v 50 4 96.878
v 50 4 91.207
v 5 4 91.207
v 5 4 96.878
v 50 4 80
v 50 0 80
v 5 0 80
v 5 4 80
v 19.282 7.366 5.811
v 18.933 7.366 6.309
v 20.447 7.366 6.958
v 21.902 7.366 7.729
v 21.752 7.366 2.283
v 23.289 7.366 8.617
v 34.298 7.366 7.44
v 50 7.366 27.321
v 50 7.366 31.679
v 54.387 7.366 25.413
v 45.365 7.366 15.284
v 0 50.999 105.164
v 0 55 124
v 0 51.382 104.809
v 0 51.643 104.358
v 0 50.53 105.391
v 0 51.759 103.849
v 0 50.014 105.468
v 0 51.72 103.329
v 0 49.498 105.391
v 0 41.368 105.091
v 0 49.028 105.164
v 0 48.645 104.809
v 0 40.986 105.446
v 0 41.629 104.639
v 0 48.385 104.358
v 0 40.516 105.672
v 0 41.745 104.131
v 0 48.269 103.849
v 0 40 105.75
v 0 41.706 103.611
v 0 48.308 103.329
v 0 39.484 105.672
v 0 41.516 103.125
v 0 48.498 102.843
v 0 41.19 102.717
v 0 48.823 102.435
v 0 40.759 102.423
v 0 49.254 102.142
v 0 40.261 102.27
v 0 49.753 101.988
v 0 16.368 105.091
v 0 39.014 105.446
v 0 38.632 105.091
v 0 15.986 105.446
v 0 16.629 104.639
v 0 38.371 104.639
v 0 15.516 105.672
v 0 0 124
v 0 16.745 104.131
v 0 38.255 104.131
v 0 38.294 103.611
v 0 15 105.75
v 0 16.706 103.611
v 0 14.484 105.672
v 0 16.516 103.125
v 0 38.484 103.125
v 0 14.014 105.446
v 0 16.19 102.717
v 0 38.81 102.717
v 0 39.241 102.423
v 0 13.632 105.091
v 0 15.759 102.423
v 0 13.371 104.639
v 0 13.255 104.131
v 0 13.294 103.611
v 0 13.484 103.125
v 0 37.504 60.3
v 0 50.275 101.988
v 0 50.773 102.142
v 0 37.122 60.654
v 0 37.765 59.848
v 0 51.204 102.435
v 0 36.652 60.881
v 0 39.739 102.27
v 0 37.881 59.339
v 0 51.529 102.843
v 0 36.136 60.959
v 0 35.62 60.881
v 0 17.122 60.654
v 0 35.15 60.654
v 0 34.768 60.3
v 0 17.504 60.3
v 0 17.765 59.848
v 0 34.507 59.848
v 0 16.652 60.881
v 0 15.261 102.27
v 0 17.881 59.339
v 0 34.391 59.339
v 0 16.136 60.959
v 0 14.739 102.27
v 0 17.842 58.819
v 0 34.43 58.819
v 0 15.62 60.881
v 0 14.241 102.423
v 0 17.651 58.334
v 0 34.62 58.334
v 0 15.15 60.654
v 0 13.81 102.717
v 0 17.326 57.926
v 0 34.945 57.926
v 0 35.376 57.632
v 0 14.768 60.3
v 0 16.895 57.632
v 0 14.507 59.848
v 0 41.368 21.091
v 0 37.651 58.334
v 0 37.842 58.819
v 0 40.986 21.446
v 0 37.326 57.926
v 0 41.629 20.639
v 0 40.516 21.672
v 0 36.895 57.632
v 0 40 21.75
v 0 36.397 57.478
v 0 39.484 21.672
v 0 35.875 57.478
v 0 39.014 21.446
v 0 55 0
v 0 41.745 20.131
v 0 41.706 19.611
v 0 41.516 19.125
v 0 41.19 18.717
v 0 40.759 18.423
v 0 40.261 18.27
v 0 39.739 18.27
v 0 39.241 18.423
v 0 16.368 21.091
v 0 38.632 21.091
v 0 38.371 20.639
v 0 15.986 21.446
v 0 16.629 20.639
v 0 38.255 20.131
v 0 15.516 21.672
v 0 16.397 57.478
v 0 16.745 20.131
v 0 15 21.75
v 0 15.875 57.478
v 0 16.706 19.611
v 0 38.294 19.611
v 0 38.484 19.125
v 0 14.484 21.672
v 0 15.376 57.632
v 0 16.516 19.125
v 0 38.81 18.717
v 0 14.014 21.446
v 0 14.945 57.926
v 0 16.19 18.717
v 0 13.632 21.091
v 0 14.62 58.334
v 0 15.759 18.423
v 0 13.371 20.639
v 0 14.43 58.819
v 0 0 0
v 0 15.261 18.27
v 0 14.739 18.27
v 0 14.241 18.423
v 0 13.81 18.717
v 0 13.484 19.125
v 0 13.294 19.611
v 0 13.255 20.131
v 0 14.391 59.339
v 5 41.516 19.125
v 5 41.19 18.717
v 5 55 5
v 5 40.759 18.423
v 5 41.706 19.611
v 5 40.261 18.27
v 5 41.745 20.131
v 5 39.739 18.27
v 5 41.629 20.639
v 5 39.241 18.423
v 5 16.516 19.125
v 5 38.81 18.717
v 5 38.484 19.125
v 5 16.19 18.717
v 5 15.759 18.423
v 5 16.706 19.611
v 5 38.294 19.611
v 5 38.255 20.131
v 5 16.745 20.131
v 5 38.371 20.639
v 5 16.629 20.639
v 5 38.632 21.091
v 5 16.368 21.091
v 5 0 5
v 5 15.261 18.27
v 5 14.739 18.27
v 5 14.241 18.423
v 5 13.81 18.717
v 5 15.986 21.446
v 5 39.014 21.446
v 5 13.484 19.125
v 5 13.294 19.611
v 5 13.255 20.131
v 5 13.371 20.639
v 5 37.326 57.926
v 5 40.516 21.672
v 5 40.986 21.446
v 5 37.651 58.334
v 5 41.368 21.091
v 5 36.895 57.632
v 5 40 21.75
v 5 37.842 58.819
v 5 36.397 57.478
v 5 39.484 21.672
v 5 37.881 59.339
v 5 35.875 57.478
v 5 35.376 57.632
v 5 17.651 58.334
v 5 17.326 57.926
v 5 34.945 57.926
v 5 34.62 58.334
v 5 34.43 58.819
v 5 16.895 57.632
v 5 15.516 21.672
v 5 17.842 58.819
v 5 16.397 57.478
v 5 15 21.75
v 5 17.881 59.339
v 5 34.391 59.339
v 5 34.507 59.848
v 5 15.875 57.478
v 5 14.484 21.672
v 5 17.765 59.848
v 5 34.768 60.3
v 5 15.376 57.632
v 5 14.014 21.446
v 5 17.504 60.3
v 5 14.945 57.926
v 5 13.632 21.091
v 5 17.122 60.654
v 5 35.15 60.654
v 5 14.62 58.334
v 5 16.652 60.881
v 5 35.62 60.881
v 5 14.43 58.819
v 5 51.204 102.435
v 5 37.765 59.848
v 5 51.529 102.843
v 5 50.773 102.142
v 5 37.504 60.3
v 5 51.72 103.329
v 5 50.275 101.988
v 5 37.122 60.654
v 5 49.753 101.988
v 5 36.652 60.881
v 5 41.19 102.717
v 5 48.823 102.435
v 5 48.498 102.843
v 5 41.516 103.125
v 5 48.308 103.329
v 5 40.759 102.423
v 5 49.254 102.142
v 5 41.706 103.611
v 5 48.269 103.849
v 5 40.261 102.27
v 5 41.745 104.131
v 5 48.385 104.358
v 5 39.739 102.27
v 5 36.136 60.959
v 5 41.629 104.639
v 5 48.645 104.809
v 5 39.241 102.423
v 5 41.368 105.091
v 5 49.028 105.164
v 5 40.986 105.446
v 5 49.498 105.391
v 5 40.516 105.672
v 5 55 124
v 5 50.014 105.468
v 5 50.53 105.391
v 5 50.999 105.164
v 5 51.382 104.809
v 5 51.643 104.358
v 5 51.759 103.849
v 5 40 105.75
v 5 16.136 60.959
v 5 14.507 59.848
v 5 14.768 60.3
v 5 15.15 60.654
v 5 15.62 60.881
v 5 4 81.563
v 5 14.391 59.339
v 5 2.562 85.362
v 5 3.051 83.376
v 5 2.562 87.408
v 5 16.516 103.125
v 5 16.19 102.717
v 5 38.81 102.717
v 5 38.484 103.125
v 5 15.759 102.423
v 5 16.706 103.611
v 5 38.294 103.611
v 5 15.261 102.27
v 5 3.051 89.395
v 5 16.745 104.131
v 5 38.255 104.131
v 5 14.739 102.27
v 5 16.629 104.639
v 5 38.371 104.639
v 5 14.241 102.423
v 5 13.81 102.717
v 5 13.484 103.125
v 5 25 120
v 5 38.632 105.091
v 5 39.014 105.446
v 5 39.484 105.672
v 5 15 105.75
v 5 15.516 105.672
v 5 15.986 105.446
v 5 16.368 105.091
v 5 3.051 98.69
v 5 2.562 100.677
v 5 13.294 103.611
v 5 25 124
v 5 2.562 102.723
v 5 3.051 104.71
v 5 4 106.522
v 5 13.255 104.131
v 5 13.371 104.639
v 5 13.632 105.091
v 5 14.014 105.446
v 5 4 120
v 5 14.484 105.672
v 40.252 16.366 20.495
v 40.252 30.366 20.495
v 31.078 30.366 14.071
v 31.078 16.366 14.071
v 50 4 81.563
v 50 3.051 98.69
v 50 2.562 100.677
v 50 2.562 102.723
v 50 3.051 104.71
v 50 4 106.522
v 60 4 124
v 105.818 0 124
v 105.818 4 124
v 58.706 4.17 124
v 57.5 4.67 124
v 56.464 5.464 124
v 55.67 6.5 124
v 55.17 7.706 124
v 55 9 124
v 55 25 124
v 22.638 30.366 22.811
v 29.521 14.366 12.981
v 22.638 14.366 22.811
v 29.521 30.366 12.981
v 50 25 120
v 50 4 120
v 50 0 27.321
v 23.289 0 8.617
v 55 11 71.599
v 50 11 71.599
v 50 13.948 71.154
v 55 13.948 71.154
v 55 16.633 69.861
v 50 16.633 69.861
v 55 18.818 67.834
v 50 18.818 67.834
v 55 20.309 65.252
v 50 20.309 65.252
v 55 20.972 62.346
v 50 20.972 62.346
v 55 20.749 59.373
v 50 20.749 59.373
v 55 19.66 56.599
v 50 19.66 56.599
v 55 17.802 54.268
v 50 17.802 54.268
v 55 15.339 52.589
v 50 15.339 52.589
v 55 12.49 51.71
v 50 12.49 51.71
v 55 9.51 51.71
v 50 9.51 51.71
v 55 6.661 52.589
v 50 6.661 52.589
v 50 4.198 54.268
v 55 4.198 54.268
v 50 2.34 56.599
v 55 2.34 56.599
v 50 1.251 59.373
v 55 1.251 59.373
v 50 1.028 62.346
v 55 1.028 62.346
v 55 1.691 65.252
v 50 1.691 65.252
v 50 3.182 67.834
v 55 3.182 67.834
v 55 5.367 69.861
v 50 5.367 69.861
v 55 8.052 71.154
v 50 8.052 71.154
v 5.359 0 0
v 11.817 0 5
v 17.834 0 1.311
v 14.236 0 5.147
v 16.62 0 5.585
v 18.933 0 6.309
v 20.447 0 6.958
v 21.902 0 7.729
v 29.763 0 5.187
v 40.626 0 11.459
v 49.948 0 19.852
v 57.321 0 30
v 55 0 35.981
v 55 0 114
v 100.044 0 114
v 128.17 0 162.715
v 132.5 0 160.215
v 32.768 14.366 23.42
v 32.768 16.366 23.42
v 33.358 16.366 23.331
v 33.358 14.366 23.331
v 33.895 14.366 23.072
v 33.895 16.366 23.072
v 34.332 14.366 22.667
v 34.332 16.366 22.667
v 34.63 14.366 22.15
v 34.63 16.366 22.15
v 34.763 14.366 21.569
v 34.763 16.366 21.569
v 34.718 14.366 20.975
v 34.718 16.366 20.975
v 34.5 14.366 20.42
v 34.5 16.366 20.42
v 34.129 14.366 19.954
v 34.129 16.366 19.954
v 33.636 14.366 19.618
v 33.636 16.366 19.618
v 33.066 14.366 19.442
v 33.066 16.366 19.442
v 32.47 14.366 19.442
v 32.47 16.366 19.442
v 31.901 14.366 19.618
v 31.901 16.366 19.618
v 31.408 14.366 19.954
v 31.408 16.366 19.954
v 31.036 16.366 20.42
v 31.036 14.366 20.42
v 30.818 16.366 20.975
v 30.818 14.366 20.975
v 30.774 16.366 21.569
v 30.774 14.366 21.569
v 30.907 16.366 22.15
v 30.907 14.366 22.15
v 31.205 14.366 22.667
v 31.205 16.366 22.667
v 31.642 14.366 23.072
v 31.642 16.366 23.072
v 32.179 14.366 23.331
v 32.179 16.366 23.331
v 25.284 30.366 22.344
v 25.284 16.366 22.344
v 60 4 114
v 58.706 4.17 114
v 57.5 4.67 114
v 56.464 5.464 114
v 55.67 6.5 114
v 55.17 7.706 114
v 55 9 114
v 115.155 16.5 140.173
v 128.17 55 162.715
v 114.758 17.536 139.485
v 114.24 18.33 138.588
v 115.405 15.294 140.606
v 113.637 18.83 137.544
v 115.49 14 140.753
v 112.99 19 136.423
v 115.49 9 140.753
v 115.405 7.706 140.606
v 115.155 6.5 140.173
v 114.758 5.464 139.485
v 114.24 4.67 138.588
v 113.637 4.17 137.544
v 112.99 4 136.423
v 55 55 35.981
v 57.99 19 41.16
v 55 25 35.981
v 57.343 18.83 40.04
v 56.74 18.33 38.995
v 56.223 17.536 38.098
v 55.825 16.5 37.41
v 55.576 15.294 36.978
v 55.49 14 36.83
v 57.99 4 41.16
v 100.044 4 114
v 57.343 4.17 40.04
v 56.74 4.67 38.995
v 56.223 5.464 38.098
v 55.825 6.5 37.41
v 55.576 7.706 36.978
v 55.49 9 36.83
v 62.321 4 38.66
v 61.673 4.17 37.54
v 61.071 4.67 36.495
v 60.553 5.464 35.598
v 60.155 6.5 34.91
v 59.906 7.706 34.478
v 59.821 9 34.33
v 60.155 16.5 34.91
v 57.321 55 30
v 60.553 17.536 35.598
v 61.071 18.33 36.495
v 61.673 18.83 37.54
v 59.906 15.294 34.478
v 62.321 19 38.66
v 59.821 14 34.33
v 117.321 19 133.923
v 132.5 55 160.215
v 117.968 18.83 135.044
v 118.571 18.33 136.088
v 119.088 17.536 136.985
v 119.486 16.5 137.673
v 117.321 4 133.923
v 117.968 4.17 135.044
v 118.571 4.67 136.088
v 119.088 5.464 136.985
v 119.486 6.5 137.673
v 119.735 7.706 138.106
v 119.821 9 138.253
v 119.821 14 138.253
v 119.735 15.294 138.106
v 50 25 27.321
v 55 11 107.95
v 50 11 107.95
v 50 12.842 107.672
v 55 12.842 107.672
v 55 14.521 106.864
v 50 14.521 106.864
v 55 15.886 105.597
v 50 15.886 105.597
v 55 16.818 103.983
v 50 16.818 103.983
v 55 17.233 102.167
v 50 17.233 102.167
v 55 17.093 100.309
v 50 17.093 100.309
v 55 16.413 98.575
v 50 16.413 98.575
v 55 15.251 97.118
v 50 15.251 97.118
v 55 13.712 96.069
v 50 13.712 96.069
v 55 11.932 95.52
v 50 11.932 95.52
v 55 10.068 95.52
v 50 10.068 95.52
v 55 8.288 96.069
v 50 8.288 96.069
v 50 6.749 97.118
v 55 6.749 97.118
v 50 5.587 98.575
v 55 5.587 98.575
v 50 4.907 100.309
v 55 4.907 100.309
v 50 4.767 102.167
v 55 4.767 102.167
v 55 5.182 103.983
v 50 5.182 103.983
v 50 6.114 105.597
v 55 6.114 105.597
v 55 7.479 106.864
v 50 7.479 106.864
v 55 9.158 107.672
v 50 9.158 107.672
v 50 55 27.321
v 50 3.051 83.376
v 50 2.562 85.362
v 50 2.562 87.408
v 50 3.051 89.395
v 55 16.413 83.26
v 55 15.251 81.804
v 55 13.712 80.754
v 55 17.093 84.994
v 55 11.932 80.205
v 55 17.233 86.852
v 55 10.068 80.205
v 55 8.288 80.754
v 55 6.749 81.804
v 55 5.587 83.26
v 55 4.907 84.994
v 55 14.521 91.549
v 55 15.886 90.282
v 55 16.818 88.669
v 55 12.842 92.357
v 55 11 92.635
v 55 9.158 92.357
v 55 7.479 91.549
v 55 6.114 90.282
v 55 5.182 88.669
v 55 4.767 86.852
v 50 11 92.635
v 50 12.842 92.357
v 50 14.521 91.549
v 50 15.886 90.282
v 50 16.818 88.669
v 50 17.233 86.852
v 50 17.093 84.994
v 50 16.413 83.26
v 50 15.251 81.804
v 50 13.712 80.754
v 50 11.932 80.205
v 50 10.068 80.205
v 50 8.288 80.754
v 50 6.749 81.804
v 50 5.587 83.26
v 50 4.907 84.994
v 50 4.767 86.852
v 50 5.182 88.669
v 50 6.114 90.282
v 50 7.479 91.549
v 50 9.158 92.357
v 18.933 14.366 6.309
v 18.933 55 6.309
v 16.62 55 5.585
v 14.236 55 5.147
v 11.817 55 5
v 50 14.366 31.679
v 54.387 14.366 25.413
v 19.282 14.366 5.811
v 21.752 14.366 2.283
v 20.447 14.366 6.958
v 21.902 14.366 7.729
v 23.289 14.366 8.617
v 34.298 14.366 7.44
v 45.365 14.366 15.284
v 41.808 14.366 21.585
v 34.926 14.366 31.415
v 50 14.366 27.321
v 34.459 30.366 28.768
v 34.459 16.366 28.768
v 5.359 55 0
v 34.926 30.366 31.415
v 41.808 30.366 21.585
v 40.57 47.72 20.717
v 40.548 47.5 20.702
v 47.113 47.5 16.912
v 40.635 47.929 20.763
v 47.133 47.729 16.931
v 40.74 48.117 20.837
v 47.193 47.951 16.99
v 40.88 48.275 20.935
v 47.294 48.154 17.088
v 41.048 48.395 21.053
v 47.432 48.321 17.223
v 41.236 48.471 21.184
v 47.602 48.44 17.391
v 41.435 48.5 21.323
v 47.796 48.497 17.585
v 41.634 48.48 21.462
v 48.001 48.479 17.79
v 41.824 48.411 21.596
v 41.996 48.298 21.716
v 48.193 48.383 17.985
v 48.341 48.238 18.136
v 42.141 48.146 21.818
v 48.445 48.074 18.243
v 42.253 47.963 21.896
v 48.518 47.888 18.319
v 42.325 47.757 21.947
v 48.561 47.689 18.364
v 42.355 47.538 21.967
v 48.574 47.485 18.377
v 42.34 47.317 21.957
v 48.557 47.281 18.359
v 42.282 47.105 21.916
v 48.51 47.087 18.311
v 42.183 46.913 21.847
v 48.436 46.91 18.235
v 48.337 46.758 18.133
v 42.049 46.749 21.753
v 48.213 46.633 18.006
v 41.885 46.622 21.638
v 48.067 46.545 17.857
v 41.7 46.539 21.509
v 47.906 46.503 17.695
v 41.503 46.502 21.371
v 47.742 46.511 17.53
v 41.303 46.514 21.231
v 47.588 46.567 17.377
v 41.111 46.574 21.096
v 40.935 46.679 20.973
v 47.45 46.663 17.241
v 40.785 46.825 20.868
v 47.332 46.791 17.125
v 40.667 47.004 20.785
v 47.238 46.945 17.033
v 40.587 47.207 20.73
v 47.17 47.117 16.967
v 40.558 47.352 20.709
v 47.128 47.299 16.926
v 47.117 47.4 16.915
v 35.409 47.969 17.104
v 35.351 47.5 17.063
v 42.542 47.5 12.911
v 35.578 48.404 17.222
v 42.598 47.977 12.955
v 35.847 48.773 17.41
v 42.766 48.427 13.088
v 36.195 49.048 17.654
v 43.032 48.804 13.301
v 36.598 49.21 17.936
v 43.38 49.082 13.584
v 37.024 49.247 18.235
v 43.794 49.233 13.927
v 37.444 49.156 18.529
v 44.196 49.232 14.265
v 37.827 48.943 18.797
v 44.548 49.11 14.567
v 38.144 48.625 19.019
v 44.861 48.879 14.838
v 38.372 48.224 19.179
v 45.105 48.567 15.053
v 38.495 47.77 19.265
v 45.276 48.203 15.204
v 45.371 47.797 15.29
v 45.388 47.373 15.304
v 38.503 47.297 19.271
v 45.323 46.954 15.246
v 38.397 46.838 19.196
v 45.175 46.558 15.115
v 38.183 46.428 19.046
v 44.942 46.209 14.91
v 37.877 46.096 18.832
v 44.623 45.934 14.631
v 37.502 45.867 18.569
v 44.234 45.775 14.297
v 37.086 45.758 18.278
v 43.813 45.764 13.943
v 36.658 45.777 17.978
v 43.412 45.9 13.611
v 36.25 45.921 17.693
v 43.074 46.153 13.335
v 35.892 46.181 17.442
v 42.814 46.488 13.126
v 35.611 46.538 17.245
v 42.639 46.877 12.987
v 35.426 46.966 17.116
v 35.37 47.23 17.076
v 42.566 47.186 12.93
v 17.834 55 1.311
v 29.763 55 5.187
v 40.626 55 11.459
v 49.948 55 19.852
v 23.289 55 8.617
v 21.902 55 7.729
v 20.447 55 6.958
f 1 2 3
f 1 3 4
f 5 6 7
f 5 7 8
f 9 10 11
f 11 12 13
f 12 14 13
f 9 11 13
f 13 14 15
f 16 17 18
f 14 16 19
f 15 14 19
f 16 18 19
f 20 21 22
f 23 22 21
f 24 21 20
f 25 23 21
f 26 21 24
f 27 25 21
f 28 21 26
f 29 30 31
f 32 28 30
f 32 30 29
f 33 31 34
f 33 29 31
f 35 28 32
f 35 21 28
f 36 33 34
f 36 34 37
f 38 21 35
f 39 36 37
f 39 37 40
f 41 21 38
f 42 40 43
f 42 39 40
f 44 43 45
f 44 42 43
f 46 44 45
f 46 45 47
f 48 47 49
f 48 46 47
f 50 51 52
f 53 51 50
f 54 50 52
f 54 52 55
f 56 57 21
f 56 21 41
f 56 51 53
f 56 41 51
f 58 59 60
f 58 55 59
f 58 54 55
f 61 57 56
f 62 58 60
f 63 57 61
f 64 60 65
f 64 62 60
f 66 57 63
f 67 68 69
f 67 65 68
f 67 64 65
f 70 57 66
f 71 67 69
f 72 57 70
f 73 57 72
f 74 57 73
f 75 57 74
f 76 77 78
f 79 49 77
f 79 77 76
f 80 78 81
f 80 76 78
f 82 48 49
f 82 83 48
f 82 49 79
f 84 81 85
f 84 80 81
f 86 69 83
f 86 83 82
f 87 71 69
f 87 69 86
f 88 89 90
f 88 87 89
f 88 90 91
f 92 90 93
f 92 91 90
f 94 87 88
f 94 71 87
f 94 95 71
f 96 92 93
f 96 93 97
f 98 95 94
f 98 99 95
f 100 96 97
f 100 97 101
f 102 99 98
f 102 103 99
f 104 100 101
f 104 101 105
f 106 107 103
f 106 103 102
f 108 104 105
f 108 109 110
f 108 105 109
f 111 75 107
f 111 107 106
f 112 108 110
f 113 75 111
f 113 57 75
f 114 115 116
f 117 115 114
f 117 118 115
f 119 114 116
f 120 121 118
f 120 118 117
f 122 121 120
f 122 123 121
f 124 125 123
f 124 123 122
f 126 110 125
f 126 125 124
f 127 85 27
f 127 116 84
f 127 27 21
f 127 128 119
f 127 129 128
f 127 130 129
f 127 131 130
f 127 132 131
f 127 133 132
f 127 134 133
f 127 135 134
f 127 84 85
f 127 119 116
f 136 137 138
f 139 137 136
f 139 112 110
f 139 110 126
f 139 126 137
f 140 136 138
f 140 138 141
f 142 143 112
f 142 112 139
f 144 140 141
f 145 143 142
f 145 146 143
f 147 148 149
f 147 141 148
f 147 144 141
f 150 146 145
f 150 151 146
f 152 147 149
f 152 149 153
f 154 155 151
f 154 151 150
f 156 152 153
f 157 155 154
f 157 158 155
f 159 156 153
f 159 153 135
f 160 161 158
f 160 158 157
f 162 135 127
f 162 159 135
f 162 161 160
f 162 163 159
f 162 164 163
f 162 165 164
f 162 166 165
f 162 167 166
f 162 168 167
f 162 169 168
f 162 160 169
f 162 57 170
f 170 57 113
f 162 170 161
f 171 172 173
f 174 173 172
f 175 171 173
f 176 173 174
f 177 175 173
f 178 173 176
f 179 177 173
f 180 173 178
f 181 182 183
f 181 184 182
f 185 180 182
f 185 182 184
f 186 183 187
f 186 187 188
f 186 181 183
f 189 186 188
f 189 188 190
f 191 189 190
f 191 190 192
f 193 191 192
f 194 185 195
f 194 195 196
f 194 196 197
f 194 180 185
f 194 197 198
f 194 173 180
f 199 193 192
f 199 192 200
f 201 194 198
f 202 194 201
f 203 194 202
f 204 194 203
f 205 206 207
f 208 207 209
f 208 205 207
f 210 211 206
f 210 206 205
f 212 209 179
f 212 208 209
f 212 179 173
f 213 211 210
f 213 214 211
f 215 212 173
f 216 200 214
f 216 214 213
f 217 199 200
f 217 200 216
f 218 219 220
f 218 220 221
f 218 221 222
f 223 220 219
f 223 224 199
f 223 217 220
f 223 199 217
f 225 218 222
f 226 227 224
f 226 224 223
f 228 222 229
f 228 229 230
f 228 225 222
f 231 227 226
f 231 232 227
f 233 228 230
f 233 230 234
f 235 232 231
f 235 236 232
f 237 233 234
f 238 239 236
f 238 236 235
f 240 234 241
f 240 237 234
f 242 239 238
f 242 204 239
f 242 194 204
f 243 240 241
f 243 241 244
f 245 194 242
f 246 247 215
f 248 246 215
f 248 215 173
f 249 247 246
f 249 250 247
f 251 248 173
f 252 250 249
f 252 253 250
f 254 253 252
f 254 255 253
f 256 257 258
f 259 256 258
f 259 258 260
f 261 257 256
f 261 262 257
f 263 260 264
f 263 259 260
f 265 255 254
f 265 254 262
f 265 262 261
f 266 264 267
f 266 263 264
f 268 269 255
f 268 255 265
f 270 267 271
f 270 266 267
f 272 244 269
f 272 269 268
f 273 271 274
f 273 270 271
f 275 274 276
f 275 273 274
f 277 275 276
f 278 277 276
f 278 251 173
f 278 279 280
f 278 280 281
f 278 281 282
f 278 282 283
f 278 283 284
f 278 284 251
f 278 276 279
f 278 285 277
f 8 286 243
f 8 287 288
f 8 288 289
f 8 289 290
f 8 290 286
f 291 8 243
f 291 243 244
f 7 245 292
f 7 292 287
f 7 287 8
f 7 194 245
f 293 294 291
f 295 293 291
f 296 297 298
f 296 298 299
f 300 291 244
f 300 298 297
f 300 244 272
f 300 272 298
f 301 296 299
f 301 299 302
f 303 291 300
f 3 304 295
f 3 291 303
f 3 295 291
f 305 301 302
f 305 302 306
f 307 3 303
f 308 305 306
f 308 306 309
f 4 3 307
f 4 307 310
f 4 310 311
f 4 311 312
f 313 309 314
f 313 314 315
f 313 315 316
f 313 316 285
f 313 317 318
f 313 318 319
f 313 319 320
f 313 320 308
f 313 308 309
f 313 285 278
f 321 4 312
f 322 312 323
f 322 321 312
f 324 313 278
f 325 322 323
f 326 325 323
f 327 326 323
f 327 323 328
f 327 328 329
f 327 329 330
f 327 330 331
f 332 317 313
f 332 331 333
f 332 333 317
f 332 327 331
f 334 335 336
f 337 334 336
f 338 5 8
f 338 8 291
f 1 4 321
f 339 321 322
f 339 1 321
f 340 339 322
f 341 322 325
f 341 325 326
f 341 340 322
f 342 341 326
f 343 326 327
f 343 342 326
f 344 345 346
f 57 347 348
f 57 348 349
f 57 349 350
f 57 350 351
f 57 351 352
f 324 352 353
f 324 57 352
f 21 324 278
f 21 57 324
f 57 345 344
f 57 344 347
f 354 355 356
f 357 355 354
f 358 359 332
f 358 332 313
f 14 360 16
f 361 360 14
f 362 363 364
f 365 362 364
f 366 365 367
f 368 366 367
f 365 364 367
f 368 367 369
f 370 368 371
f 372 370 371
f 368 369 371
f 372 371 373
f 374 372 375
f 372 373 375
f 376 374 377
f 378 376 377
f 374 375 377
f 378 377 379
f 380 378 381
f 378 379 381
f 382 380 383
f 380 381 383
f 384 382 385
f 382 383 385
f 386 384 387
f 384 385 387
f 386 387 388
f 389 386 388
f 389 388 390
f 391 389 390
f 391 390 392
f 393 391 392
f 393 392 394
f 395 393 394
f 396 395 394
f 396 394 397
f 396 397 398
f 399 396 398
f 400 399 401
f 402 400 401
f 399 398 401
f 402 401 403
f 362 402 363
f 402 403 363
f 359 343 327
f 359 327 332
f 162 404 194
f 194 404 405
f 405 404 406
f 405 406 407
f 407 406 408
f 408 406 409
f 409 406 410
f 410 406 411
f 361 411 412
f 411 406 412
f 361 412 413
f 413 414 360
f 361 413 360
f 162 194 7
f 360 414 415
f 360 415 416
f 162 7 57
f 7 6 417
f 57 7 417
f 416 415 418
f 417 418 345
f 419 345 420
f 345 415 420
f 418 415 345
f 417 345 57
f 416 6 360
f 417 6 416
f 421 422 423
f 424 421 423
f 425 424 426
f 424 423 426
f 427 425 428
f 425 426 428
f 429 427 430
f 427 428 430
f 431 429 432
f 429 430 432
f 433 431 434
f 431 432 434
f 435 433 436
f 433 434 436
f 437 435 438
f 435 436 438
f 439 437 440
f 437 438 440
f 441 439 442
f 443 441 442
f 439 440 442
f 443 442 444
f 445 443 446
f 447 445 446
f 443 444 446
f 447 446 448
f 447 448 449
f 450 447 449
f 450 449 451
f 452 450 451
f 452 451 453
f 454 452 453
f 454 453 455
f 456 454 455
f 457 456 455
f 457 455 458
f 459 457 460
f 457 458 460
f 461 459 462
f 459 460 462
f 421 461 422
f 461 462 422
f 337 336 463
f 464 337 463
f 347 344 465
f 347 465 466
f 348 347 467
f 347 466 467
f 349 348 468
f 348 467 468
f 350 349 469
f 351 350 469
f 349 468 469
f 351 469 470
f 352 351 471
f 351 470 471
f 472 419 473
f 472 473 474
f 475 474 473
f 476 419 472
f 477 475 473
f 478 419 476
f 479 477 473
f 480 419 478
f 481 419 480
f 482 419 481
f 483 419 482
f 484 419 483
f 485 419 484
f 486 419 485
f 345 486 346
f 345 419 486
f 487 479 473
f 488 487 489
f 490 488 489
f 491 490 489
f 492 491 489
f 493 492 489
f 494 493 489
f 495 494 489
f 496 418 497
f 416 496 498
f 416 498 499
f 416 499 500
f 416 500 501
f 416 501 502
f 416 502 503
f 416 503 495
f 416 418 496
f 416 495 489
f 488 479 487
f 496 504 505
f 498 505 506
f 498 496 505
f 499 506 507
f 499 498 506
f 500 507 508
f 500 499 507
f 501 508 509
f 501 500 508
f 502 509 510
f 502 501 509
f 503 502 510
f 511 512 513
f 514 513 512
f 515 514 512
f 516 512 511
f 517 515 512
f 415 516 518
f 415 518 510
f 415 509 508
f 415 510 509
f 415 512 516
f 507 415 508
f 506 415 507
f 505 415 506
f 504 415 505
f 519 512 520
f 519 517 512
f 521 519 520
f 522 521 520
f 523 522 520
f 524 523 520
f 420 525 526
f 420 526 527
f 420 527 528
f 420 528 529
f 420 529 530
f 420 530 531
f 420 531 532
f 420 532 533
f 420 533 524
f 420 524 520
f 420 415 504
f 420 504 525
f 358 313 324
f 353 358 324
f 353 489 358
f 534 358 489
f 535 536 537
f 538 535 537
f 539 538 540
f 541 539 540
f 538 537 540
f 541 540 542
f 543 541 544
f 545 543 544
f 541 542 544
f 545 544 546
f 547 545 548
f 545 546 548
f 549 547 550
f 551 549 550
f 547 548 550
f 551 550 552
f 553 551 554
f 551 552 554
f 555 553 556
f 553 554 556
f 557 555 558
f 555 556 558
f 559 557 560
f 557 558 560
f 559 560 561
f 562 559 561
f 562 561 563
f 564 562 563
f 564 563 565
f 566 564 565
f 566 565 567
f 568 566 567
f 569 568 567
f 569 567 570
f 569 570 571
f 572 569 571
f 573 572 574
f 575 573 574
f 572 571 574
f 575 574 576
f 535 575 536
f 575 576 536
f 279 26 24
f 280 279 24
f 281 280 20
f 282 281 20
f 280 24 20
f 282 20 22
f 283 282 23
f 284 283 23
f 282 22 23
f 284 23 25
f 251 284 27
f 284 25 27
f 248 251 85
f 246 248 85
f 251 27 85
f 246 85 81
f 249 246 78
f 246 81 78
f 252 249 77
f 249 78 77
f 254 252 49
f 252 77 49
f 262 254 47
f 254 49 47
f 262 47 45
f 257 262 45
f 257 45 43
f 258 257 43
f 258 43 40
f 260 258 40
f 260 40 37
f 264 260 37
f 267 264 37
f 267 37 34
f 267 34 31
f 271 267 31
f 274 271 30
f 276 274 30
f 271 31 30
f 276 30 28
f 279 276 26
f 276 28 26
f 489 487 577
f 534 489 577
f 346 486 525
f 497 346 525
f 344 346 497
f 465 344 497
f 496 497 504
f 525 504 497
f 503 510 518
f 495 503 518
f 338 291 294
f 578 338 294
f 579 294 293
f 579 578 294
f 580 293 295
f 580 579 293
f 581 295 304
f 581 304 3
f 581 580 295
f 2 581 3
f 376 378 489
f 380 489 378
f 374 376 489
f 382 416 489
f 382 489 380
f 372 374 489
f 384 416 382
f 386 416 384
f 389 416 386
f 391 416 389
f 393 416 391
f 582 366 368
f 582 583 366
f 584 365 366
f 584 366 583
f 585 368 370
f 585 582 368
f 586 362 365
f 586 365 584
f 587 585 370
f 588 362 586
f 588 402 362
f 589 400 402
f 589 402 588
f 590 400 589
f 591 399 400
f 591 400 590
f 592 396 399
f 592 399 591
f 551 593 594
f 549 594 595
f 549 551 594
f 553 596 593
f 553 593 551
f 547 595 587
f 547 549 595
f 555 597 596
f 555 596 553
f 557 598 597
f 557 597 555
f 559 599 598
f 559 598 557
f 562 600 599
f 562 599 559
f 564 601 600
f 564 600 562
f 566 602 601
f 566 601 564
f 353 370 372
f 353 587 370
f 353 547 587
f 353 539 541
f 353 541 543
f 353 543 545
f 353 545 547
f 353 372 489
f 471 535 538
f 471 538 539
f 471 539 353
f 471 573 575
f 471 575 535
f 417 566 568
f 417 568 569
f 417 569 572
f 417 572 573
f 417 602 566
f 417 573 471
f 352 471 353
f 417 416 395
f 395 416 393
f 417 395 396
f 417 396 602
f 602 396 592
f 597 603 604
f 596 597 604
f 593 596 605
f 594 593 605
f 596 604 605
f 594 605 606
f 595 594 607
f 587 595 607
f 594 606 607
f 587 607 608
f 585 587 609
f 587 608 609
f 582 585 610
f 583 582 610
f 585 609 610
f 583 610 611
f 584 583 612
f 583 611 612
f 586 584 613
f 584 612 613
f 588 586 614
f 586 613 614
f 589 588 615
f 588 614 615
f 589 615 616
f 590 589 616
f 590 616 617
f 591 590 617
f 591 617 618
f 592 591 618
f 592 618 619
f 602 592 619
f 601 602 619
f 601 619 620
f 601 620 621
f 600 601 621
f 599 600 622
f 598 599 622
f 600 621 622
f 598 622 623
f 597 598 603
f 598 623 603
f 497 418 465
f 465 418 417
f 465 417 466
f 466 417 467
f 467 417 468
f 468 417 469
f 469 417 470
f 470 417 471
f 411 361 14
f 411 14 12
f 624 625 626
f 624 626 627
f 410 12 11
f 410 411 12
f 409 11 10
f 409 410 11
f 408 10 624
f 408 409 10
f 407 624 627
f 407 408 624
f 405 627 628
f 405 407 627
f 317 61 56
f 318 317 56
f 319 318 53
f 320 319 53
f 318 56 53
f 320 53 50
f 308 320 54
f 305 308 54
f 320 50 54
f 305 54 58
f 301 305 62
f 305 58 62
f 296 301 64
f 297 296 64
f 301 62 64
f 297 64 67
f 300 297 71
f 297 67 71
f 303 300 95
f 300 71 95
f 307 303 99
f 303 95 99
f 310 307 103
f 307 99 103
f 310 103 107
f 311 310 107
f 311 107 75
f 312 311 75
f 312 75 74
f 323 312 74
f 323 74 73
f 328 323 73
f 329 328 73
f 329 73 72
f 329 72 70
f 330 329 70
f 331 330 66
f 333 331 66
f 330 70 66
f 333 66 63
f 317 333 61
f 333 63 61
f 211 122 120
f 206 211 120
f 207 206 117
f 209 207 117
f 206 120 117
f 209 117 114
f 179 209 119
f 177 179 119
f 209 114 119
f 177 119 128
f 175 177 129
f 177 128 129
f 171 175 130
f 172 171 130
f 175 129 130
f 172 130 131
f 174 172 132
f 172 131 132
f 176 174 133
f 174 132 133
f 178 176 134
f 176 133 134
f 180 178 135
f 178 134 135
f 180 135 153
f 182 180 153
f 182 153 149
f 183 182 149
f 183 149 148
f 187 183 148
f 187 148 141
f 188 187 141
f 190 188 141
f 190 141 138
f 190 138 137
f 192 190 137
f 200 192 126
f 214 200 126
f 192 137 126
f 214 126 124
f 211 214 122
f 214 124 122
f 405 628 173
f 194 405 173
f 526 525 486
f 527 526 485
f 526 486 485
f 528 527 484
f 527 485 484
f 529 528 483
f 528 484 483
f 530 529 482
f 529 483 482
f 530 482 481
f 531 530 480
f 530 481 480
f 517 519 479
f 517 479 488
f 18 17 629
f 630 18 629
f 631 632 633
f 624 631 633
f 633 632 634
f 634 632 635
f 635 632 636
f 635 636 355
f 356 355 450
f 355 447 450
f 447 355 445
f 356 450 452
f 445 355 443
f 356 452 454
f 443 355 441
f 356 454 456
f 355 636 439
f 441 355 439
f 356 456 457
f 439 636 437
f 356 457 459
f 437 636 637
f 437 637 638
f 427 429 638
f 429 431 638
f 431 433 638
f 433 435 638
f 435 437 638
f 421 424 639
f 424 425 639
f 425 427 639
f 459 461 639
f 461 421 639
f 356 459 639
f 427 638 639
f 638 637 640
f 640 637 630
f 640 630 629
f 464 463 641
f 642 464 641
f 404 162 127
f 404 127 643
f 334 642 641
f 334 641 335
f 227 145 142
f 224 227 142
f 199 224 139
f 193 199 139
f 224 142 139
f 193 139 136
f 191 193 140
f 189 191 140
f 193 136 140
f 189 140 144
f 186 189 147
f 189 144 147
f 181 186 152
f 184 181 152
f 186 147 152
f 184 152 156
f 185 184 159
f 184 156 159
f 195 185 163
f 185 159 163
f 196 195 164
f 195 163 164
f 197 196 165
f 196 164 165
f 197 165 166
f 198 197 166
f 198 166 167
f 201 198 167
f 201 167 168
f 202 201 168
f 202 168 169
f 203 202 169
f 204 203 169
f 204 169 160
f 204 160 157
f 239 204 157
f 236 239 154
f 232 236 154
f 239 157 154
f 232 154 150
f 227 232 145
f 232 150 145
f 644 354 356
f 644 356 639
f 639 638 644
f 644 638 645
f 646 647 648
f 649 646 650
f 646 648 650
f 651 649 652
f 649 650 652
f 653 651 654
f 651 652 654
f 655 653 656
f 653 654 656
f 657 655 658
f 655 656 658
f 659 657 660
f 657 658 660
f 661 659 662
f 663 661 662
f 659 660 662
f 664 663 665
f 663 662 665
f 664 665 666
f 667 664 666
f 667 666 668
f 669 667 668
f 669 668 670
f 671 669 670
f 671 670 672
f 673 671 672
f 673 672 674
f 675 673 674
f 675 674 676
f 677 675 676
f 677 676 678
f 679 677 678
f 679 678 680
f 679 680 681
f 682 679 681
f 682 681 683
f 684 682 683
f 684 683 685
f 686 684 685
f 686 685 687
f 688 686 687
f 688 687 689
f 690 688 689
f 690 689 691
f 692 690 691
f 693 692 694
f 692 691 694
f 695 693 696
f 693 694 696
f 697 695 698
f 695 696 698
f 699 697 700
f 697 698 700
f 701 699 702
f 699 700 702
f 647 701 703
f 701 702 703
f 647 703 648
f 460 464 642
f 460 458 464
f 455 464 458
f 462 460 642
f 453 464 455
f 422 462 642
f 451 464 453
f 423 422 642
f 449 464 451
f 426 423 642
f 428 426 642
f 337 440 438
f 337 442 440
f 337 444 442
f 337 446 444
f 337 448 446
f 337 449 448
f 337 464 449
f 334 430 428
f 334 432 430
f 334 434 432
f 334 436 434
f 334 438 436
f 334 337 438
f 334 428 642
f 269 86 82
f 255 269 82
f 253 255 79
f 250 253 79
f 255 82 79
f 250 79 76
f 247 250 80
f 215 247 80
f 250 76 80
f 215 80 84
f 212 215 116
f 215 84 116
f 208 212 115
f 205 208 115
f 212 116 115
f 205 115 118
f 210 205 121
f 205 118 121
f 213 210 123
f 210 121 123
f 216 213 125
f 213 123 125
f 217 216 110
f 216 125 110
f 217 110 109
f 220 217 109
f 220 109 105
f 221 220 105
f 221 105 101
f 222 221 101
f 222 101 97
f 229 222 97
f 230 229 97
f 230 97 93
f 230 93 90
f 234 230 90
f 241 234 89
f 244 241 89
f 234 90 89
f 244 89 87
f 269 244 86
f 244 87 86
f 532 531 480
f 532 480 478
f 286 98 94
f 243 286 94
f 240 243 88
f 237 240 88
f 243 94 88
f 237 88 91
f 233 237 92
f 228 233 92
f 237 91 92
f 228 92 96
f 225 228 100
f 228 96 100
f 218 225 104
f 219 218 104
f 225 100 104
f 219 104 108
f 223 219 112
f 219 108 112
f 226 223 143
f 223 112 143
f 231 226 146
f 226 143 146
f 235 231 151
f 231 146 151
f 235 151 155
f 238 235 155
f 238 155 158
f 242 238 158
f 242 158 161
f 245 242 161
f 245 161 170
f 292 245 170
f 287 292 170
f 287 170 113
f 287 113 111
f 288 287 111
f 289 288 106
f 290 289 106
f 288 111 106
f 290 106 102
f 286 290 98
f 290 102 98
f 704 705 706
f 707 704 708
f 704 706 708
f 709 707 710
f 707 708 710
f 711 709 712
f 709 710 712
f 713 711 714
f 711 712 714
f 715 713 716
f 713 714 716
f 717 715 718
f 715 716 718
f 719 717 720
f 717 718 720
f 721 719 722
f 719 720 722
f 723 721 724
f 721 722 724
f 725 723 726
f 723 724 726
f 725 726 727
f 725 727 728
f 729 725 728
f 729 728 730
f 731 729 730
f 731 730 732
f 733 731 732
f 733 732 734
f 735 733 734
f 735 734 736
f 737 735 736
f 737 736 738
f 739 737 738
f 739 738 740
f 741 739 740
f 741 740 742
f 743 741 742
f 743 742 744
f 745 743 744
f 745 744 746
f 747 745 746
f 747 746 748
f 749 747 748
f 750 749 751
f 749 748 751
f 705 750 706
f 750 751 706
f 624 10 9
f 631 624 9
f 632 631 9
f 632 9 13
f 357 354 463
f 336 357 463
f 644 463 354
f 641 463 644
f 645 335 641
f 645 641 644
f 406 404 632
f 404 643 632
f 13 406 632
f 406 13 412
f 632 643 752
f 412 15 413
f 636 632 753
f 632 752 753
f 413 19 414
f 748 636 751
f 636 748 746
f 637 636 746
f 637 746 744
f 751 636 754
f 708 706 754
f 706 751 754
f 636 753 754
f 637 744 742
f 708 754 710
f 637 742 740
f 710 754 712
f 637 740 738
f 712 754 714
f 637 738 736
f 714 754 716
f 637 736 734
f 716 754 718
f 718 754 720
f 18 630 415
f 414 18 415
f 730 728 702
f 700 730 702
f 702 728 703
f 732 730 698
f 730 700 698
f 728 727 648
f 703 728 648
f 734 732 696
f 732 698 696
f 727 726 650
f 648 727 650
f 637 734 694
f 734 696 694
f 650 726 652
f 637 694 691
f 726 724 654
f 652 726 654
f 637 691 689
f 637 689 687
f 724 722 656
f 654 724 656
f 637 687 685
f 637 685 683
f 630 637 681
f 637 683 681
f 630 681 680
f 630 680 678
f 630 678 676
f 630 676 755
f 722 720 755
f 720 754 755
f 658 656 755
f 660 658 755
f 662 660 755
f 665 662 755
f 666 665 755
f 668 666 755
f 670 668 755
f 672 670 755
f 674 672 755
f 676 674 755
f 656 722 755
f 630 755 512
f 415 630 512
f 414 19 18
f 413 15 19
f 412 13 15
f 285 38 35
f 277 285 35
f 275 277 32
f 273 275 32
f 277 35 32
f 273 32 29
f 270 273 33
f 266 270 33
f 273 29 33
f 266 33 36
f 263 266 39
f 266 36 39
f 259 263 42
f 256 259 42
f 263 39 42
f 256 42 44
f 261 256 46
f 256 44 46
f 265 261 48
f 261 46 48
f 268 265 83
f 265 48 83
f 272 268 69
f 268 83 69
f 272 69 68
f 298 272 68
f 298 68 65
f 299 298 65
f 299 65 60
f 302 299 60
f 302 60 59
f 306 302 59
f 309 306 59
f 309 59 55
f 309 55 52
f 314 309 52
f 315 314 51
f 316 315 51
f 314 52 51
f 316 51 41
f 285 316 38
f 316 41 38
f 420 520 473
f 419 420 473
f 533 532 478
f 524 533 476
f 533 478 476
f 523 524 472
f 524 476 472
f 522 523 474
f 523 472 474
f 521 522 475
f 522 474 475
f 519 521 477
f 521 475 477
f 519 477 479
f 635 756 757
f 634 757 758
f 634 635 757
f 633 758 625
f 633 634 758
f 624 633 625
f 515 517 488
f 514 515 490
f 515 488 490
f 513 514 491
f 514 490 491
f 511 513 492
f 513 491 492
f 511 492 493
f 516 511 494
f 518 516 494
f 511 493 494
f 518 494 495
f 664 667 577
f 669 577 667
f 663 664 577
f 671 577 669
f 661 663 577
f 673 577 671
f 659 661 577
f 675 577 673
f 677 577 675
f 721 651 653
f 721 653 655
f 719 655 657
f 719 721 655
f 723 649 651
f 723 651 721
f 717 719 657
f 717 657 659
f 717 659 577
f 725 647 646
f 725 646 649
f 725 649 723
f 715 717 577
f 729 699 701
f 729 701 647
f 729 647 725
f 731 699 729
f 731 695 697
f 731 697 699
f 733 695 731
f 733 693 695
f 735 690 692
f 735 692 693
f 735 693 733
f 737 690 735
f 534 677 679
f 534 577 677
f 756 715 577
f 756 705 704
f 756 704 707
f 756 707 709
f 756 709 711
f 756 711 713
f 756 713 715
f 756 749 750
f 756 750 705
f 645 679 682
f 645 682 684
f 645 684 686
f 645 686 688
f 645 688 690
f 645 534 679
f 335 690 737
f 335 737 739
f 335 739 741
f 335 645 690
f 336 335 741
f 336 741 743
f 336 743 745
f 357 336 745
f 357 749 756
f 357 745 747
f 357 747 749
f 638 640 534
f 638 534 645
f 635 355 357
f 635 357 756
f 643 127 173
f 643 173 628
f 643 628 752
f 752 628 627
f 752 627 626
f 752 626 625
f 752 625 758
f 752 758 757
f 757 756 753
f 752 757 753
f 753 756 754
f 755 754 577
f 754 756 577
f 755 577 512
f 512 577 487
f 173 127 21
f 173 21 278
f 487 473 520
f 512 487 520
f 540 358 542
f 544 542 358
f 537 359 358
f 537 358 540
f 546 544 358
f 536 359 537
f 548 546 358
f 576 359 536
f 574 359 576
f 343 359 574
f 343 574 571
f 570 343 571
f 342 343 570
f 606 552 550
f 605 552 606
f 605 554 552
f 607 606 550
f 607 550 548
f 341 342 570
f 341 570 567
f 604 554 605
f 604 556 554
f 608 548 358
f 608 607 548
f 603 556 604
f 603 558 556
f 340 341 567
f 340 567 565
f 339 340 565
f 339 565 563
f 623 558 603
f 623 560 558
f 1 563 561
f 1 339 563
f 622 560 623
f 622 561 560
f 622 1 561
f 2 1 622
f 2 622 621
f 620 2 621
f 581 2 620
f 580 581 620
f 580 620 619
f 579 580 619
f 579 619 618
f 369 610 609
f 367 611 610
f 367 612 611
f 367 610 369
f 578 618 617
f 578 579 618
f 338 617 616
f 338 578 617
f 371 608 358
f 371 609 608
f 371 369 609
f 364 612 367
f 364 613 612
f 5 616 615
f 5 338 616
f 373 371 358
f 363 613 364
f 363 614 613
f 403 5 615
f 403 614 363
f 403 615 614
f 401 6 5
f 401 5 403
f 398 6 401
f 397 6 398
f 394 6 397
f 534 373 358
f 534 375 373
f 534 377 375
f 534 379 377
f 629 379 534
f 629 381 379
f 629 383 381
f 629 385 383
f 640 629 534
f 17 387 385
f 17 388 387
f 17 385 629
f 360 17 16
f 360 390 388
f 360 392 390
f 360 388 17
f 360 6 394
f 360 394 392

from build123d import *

# Parameters (mm, degrees)
BOSS_EXTRUDE3_DEPTH     = 55
FILLET1_R               = 60
SKETCH4_W               = 15
SKETCH4_H               = 16
BOSS_EXTRUDE4_DEPTH     = 12
CUT_EXTRUDE1_DEPTH      = 20
CUT_EXTRUDE1_DEPTH_BACK = 14
SKETCH5_W               = 40
SKETCH5_H               = 7
CUT_EXTRUDE2_DEPTH      = 14
SKETCH7_R               = 2
CUT_EXTRUDE3_DEPTH      = 2
CUT_EXTRUDE4_DEPTH      = 30
SKETCH9_R               = 10
SKETCH9_R_2             = 6.25
CUT_EXTRUDE5_DEPTH      = 5
SKETCH10_W              = 120
SKETCH10_H              = 15
CUT_EXTRUDE6_DEPTH      = 5
SKETCH11_W              = 4
SKETCH11_H              = 25
BOSS_EXTRUDE5_DEPTH     = 45
FILLET3_R               = 20
BOSS_EXTRUDE6_REACH     = 190.434
SKETCH12_W              = 10
SKETCH12_H              = 4
SKETCH13_W              = 40
SKETCH13_H              = 4
BOSS_EXTRUDE7_DEPTH     = 45
FILLET4_R               = 5
FILLET5_R               = 5
CUT_EXTRUDE7_DEPTH      = 45
SKETCH16_R              = 1.75
CUT_EXTRUDE8_DEPTH      = 5
SKETCH15_R              = 1.75
CUT_EXTRUDE9_DEPTH      = 5
CUT_EXTRUDE10_REACH     = 216.345
SKETCH17_R              = 1.75
SKETCH17_R_2            = 1


with BuildPart() as part:
    # Sketch3 → Boss-Extrude3 (new body)
    with BuildSketch(Plane(origin=(0, 0, 0), x_dir=(1, 0, 0), z_dir=(0, 1, 0))):
        Polygon((128.169872981, -162.7146997), (55, -35.980762114), (55, -124), (50, -124), (50, -27.320508076), (18.123010882, -5), (5, -5), (5, -124), (0, -124), (0, 0), (40, 0), (132.5, -160.2146997), align=None)
    extrude(amount=BOSS_EXTRUDE3_DEPTH)

    # Fillet1
    fillet1_edges = [part.edges().sort_by_distance(p)[0] for p in [
        (40, 27.5, 0),
    ]]
    fillet(fillet1_edges, radius=FILLET1_R)

    # Sketch4 → Boss-Extrude4 (add)
    with BuildSketch(Plane(origin=(3.613056499, 0, -5.159979438), x_dir=(0.8191520442889911, 0, 0.5735764363510469), z_dir=(-0.5735764363510469, 0, 0.8191520442889911))):
        with Locations((39.128001876, 22.366188336)):
            Rectangle(SKETCH4_W, SKETCH4_H)
    extrude(amount=BOSS_EXTRUDE4_DEPTH)

    # Sketch5 → Cut-Extrude1 (cut, two sides: drawn at the far end of the back side and taken through both)
    with BuildSketch(Plane(origin=(3.613056499, 0, -5.159979438), x_dir=(0.8191520442889911, 0, 0.5735764363510469), z_dir=(-0.5735764363510469, 0, 0.8191520442889911)).offset(-CUT_EXTRUDE1_DEPTH_BACK)):
        with Locations((39.128001876, 10.866188336)):
            Rectangle(SKETCH5_W, SKETCH5_H)
    extrude(amount=CUT_EXTRUDE1_DEPTH + CUT_EXTRUDE1_DEPTH_BACK, mode=Mode.SUBTRACT)

    # Sketch6 → Cut-Extrude2 (cut)
    with BuildSketch(Plane(origin=(0, 30.366188336, 0), x_dir=(1, 0, 0), z_dir=(0, 1, 0))):
        Polygon((31.077587777, -14.070892396), (25.28446577, -22.344328043), (34.458968666, -28.76838413), (40.252090673, -20.494948483), align=None)
    extrude(amount=-CUT_EXTRUDE2_DEPTH, mode=Mode.SUBTRACT)

    # Sketch7 → Cut-Extrude3 (cut)
    with BuildSketch(Plane(origin=(0, 16.366188336, 0), x_dir=(1, 0, 0), z_dir=(0, 1, 0))):
        with Locations(Location((32.768278221, -21.419638263, 0), (0, 0, 270))):
            Circle(SKETCH7_R)
    extrude(amount=-CUT_EXTRUDE3_DEPTH, mode=Mode.SUBTRACT)

    # Sketch8 → Cut-Extrude4 (cut)
    with BuildSketch(Plane(origin=(0, 55, 0), x_dir=(1, 0, 0), z_dir=(0, 1, 0))):
        Polygon((55, -35.980762114), (50, -27.320508076), (50, -124), (55, -124), align=None)
    extrude(amount=-CUT_EXTRUDE4_DEPTH, mode=Mode.SUBTRACT)

    # Sketch9 → Cut-Extrude5 (cut)
    with BuildSketch(Plane.ZY.offset(-50)):
        with Locations((61.598678321, 11)):
            Circle(SKETCH9_R)
        with Locations((86.385123427, 11)):
            Circle(SKETCH9_R_2)
        with Locations((101.700022006, 11)):
            Circle(SKETCH9_R_2)
    extrude(amount=-CUT_EXTRUDE5_DEPTH, mode=Mode.SUBTRACT)

    # Sketch10 → Cut-Extrude6 (cut)
    with BuildSketch(Plane(origin=(30, 0, -17.320508076), x_dir=(-0.5000000000000047, 0, -0.866025403784436), z_dir=(0.866025403784436, 0, -0.5000000000000047))):
        with Locations((-119.641016151, 11.5)):
            Rectangle(SKETCH10_W, SKETCH10_H)
    extrude(amount=-CUT_EXTRUDE6_DEPTH, mode=Mode.SUBTRACT)

    # Sketch11 → Boss-Extrude5 (add)
    with BuildSketch(Plane.ZY.offset(-50)):
        with Locations((122, 12.5)):
            Rectangle(SKETCH11_W, SKETCH11_H)
    extrude(amount=BOSS_EXTRUDE5_DEPTH)

    # Fillet3
    # the kernel refuses this fillet: 20 mm, written as the material it adds along each edge
    with BuildSketch(Plane(origin=(18.123010882, 0, 5), x_dir=(-1, 0, 0), z_dir=(0, 1, 0))) as fillet3_piece_1_section:
        with BuildLine():
            CenterArc((FILLET3_R * 0.315298788879, FILLET3_R), FILLET3_R, 235, 35)
            Line((-FILLET3_R * 0.258277647472, FILLET3_R * 0.180847955711), (0, 0))
            Line((0, 0), (FILLET3_R * 0.315298788879, 0))
        make_face()
    fillet3_piece_1 = extrude(amount=55, mode=Mode.PRIVATE)
    fillet3_piece_1 = split(fillet3_piece_1, bisect_by=Plane(origin=(18.647698148, 3.683094168, 6.716980636), z_dir=(-0.8191520442889912, 0, -0.5735764363510469)), keep=Keep.TOP, mode=Mode.PRIVATE)
    fillet3_piece_1 = split(fillet3_piece_1, bisect_by=Plane(origin=(16.403340896, 7.366188336, 5.14546477), z_dir=(0, -1, 0)), keep=Keep.TOP, mode=Mode.PRIVATE)
    add(fillet3_piece_1)
    with BuildSketch(Plane(origin=(18.123010882, 0, 5), x_dir=(-1, 0, 0), z_dir=(0, 1, 0))) as fillet3_piece_2_section:
        with BuildLine():
            CenterArc((FILLET3_R * 0.315298788879, FILLET3_R), FILLET3_R, 235, 35)
            Line((-FILLET3_R * 0.258277647472, FILLET3_R * 0.180847955711), (0, 0))
            Line((0, 0), (FILLET3_R * 0.315298788879, 0))
        make_face()
    fillet3_piece_2 = extrude(amount=55, mode=Mode.PRIVATE)
    fillet3_piece_2 = split(fillet3_piece_2, bisect_by=Plane(origin=(19.32323837, 3.683094168, 5.752209215), z_dir=(0.8191520442889912, 0, 0.5735764363510469)), keep=Keep.TOP, mode=Mode.PRIVATE)
    fillet3_piece_2 = split(fillet3_piece_2, bisect_by=Plane(origin=(20.990357579, 7.366188336, 6.919538653), z_dir=(0, -1, 0)), keep=Keep.TOP, mode=Mode.PRIVATE)
    add(fillet3_piece_2)
    with BuildSketch(Plane(origin=(18.123010882, 0, 5), x_dir=(-1, 0, 0), z_dir=(0, 1, 0))) as fillet3_piece_3_section:
        with BuildLine():
            CenterArc((FILLET3_R * 0.315298788879, FILLET3_R), FILLET3_R, 235, 35)
            Line((-FILLET3_R * 0.258277647472, FILLET3_R * 0.180847955711), (0, 0))
            Line((0, 0), (FILLET3_R * 0.315298788879, 0))
        make_face()
    fillet3_piece_3 = extrude(amount=55, mode=Mode.PRIVATE)
    fillet3_piece_3 = split(fillet3_piece_3, bisect_by=Plane(origin=(16.403340896, 14.366188336, 5.14546477), z_dir=(0, -1, 0)), keep=Keep.TOP, mode=Mode.PRIVATE)
    fillet3_piece_3 = split(fillet3_piece_3, bisect_by=Plane(origin=(18.647698148, 10.866188336, 6.716980636), z_dir=(-0.8191520442889912, 0, -0.5735764363510469)), keep=Keep.TOP, mode=Mode.PRIVATE)
    fillet3_piece_3 = split(fillet3_piece_3, bisect_by=Plane(origin=(16.403340896, 7.366188336, 5.14546477), z_dir=(0, 1, 0)), keep=Keep.TOP, mode=Mode.PRIVATE)
    add(fillet3_piece_3)
    with BuildSketch(Plane(origin=(18.123010882, 0, 5), x_dir=(-1, 0, 0), z_dir=(0, 1, 0))) as fillet3_piece_4_section:
        with BuildLine():
            CenterArc((FILLET3_R * 0.315298788879, FILLET3_R), FILLET3_R, 235, 35)
            Line((-FILLET3_R * 0.258277647472, FILLET3_R * 0.180847955711), (0, 0))
            Line((0, 0), (FILLET3_R * 0.315298788879, 0))
        make_face()
    fillet3_piece_4 = extrude(amount=55, mode=Mode.PRIVATE)
    fillet3_piece_4 = split(fillet3_piece_4, bisect_by=Plane(origin=(16.403340896, 14.366188336, 5.14546477), z_dir=(0, 1, 0)), keep=Keep.TOP, mode=Mode.PRIVATE)
    fillet3_piece_4 = split(fillet3_piece_4, bisect_by=Plane(origin=(18.647698148, 34.683094168, 6.716980636), z_dir=(-0.8191520442889912, 0, -0.5735764363510469)), keep=Keep.TOP, mode=Mode.PRIVATE)
    add(fillet3_piece_4)
    with BuildSketch(Plane(origin=(18.123010882, 0, 5), x_dir=(-1, 0, 0), z_dir=(0, 1, 0))) as fillet3_piece_5_section:
        with BuildLine():
            CenterArc((FILLET3_R * 0.315298788879, FILLET3_R), FILLET3_R, 235, 35)
            Line((-FILLET3_R * 0.258277647472, FILLET3_R * 0.180847955711), (0, 0))
            Line((0, 0), (FILLET3_R * 0.315298788879, 0))
        make_face()
    fillet3_piece_5 = extrude(amount=55, mode=Mode.PRIVATE)
    fillet3_piece_5 = split(fillet3_piece_5, bisect_by=Plane(origin=(20.990357579, 14.366188336, 6.919538653), z_dir=(0, 1, 0)), keep=Keep.TOP, mode=Mode.PRIVATE)
    fillet3_piece_5 = split(fillet3_piece_5, bisect_by=Plane(origin=(19.32323837, 34.683094168, 5.752209215), z_dir=(0.8191520442889912, 0, 0.5735764363510469)), keep=Keep.TOP, mode=Mode.PRIVATE)
    add(fillet3_piece_5)

    # Boss-Extrude6: up to this plane
    boss_extrude6_end = Plane(origin=(128.169872981, 55, 162.7146997), z_dir=(-0.8660254037844362, 0, 0.5000000000000044))
    # Sketch12 → Boss-Extrude6 (add, up to the surface)
    with BuildSketch(Plane(origin=(55, 0, 0), x_dir=(0, 0, -1), z_dir=(1, 0, 0)), mode=Mode.PRIVATE) as boss_extrude6_sk1:
        with Locations((-119, 2)):
            Rectangle(SKETCH12_W, SKETCH12_H)
    boss_extrude6_tool1 = split(extrude(boss_extrude6_sk1.sketch, amount=BOSS_EXTRUDE6_REACH, mode=Mode.PRIVATE), bisect_by=boss_extrude6_end, keep=Keep.BOTH, mode=Mode.PRIVATE)
    add(boss_extrude6_tool1.solids().sort_by_distance((55, 2, 119))[0])

    # Sketch13 → Boss-Extrude7 (add)
    with BuildSketch(Plane.ZY.offset(-50)):
        with Locations((100, 2)):
            Rectangle(SKETCH13_W, SKETCH13_H)
    extrude(amount=BOSS_EXTRUDE7_DEPTH)

    # Fillet4
    fillet4_edges = [part.edges().sort_by_distance(p)[0] for p in [
        (57.655444566, 4, 35.580127019),
        (57.655444566, 19, 35.580127019),
        (117.655444566, 19, 139.503175473),
        (117.655444566, 4, 139.503175473),
    ]]
    fillet(fillet4_edges, radius=FILLET4_R)

    # Fillet5
    fillet5_edges = [part.edges().sort_by_distance(p)[0] for p in [
        (55, 4, 119),
    ]]
    fillet(fillet5_edges, radius=FILLET5_R)

    # Sketch14 → Cut-Extrude7 (cut)
    with BuildSketch(Plane.ZY.offset(-50)):
        with BuildLine():
            ThreePointArc((94.042572717, 14.689643665), (77.885123427, 11), (94.042572717, 7.310356335))
            ThreePointArc((94.042572717, 7.310356335), (110.200022006, 11), (94.042572717, 14.689643665))
        make_face()
    extrude(amount=CUT_EXTRUDE7_DEPTH, mode=Mode.SUBTRACT)

    # Sketch16 → Cut-Extrude8 (cut)
    with BuildSketch(Plane.ZY):
        with Locations((59.208509529, 36.135781847)):
            Circle(SKETCH16_R)
        with Locations((59.208509529, 16.135781847)):
            Circle(SKETCH16_R)
        with Locations((103.718271361, 50.013687011)):
            Circle(SKETCH16_R)
    extrude(amount=-CUT_EXTRUDE8_DEPTH, mode=Mode.SUBTRACT)

    # Sketch15 → Cut-Extrude9 (cut)
    with BuildSketch(Plane.ZY):
        with Locations((104, 40)):
            Circle(SKETCH15_R)
        with Locations((104, 15)):
            Circle(SKETCH15_R)
        with Locations((20, 15)):
            Circle(SKETCH15_R)
        with Locations((20, 40)):
            Circle(SKETCH15_R)
    extrude(amount=-CUT_EXTRUDE9_DEPTH, mode=Mode.SUBTRACT)

    # Cut-Extrude10: up to this plane
    cut_extrude10_end = Plane(origin=(18.123010882, 55, 5), z_dir=(0.5735764363510469, 0, -0.8191520442889914))
    # Sketch17 → Cut-Extrude10 (cut, up to the surface)
    with BuildSketch(Plane(origin=(30, 0, -17.320508076), x_dir=(-0.5000000000000047, 0, -0.866025403784436), z_dir=(0.866025403784436, 0, -0.5000000000000047)), mode=Mode.PRIVATE) as cut_extrude10_sk1:
        with Locations((-34.202339372, 47.5)):
            Circle(SKETCH17_R)
    cut_extrude10_tool1 = split(extrude(cut_extrude10_sk1.sketch, amount=-CUT_EXTRUDE10_REACH, mode=Mode.PRIVATE), bisect_by=cut_extrude10_end, keep=Keep.BOTH, mode=Mode.PRIVATE)
    add(cut_extrude10_tool1.solids().sort_by_distance((47.10117, 47.5, 12.299587))[0], mode=Mode.SUBTRACT)
    # Sketch17 → Cut-Extrude10 (cut, up to the surface)
    with BuildSketch(Plane(origin=(30, 0, -17.320508076), x_dir=(-0.5000000000000047, 0, -0.866025403784436), z_dir=(0.866025403784436, 0, -0.5000000000000047)), mode=Mode.PRIVATE) as cut_extrude10_sk2:
        with Locations((-39.202339372, 47.5)):
            Circle(SKETCH17_R_2)
    cut_extrude10_tool2 = split(extrude(cut_extrude10_sk2.sketch, amount=-CUT_EXTRUDE10_REACH, mode=Mode.PRIVATE), bisect_by=cut_extrude10_end, keep=Keep.BOTH, mode=Mode.PRIVATE)
    add(cut_extrude10_tool2.solids().sort_by_distance((49.60117, 47.5, 16.629714))[0], mode=Mode.SUBTRACT)


solid = part.part
